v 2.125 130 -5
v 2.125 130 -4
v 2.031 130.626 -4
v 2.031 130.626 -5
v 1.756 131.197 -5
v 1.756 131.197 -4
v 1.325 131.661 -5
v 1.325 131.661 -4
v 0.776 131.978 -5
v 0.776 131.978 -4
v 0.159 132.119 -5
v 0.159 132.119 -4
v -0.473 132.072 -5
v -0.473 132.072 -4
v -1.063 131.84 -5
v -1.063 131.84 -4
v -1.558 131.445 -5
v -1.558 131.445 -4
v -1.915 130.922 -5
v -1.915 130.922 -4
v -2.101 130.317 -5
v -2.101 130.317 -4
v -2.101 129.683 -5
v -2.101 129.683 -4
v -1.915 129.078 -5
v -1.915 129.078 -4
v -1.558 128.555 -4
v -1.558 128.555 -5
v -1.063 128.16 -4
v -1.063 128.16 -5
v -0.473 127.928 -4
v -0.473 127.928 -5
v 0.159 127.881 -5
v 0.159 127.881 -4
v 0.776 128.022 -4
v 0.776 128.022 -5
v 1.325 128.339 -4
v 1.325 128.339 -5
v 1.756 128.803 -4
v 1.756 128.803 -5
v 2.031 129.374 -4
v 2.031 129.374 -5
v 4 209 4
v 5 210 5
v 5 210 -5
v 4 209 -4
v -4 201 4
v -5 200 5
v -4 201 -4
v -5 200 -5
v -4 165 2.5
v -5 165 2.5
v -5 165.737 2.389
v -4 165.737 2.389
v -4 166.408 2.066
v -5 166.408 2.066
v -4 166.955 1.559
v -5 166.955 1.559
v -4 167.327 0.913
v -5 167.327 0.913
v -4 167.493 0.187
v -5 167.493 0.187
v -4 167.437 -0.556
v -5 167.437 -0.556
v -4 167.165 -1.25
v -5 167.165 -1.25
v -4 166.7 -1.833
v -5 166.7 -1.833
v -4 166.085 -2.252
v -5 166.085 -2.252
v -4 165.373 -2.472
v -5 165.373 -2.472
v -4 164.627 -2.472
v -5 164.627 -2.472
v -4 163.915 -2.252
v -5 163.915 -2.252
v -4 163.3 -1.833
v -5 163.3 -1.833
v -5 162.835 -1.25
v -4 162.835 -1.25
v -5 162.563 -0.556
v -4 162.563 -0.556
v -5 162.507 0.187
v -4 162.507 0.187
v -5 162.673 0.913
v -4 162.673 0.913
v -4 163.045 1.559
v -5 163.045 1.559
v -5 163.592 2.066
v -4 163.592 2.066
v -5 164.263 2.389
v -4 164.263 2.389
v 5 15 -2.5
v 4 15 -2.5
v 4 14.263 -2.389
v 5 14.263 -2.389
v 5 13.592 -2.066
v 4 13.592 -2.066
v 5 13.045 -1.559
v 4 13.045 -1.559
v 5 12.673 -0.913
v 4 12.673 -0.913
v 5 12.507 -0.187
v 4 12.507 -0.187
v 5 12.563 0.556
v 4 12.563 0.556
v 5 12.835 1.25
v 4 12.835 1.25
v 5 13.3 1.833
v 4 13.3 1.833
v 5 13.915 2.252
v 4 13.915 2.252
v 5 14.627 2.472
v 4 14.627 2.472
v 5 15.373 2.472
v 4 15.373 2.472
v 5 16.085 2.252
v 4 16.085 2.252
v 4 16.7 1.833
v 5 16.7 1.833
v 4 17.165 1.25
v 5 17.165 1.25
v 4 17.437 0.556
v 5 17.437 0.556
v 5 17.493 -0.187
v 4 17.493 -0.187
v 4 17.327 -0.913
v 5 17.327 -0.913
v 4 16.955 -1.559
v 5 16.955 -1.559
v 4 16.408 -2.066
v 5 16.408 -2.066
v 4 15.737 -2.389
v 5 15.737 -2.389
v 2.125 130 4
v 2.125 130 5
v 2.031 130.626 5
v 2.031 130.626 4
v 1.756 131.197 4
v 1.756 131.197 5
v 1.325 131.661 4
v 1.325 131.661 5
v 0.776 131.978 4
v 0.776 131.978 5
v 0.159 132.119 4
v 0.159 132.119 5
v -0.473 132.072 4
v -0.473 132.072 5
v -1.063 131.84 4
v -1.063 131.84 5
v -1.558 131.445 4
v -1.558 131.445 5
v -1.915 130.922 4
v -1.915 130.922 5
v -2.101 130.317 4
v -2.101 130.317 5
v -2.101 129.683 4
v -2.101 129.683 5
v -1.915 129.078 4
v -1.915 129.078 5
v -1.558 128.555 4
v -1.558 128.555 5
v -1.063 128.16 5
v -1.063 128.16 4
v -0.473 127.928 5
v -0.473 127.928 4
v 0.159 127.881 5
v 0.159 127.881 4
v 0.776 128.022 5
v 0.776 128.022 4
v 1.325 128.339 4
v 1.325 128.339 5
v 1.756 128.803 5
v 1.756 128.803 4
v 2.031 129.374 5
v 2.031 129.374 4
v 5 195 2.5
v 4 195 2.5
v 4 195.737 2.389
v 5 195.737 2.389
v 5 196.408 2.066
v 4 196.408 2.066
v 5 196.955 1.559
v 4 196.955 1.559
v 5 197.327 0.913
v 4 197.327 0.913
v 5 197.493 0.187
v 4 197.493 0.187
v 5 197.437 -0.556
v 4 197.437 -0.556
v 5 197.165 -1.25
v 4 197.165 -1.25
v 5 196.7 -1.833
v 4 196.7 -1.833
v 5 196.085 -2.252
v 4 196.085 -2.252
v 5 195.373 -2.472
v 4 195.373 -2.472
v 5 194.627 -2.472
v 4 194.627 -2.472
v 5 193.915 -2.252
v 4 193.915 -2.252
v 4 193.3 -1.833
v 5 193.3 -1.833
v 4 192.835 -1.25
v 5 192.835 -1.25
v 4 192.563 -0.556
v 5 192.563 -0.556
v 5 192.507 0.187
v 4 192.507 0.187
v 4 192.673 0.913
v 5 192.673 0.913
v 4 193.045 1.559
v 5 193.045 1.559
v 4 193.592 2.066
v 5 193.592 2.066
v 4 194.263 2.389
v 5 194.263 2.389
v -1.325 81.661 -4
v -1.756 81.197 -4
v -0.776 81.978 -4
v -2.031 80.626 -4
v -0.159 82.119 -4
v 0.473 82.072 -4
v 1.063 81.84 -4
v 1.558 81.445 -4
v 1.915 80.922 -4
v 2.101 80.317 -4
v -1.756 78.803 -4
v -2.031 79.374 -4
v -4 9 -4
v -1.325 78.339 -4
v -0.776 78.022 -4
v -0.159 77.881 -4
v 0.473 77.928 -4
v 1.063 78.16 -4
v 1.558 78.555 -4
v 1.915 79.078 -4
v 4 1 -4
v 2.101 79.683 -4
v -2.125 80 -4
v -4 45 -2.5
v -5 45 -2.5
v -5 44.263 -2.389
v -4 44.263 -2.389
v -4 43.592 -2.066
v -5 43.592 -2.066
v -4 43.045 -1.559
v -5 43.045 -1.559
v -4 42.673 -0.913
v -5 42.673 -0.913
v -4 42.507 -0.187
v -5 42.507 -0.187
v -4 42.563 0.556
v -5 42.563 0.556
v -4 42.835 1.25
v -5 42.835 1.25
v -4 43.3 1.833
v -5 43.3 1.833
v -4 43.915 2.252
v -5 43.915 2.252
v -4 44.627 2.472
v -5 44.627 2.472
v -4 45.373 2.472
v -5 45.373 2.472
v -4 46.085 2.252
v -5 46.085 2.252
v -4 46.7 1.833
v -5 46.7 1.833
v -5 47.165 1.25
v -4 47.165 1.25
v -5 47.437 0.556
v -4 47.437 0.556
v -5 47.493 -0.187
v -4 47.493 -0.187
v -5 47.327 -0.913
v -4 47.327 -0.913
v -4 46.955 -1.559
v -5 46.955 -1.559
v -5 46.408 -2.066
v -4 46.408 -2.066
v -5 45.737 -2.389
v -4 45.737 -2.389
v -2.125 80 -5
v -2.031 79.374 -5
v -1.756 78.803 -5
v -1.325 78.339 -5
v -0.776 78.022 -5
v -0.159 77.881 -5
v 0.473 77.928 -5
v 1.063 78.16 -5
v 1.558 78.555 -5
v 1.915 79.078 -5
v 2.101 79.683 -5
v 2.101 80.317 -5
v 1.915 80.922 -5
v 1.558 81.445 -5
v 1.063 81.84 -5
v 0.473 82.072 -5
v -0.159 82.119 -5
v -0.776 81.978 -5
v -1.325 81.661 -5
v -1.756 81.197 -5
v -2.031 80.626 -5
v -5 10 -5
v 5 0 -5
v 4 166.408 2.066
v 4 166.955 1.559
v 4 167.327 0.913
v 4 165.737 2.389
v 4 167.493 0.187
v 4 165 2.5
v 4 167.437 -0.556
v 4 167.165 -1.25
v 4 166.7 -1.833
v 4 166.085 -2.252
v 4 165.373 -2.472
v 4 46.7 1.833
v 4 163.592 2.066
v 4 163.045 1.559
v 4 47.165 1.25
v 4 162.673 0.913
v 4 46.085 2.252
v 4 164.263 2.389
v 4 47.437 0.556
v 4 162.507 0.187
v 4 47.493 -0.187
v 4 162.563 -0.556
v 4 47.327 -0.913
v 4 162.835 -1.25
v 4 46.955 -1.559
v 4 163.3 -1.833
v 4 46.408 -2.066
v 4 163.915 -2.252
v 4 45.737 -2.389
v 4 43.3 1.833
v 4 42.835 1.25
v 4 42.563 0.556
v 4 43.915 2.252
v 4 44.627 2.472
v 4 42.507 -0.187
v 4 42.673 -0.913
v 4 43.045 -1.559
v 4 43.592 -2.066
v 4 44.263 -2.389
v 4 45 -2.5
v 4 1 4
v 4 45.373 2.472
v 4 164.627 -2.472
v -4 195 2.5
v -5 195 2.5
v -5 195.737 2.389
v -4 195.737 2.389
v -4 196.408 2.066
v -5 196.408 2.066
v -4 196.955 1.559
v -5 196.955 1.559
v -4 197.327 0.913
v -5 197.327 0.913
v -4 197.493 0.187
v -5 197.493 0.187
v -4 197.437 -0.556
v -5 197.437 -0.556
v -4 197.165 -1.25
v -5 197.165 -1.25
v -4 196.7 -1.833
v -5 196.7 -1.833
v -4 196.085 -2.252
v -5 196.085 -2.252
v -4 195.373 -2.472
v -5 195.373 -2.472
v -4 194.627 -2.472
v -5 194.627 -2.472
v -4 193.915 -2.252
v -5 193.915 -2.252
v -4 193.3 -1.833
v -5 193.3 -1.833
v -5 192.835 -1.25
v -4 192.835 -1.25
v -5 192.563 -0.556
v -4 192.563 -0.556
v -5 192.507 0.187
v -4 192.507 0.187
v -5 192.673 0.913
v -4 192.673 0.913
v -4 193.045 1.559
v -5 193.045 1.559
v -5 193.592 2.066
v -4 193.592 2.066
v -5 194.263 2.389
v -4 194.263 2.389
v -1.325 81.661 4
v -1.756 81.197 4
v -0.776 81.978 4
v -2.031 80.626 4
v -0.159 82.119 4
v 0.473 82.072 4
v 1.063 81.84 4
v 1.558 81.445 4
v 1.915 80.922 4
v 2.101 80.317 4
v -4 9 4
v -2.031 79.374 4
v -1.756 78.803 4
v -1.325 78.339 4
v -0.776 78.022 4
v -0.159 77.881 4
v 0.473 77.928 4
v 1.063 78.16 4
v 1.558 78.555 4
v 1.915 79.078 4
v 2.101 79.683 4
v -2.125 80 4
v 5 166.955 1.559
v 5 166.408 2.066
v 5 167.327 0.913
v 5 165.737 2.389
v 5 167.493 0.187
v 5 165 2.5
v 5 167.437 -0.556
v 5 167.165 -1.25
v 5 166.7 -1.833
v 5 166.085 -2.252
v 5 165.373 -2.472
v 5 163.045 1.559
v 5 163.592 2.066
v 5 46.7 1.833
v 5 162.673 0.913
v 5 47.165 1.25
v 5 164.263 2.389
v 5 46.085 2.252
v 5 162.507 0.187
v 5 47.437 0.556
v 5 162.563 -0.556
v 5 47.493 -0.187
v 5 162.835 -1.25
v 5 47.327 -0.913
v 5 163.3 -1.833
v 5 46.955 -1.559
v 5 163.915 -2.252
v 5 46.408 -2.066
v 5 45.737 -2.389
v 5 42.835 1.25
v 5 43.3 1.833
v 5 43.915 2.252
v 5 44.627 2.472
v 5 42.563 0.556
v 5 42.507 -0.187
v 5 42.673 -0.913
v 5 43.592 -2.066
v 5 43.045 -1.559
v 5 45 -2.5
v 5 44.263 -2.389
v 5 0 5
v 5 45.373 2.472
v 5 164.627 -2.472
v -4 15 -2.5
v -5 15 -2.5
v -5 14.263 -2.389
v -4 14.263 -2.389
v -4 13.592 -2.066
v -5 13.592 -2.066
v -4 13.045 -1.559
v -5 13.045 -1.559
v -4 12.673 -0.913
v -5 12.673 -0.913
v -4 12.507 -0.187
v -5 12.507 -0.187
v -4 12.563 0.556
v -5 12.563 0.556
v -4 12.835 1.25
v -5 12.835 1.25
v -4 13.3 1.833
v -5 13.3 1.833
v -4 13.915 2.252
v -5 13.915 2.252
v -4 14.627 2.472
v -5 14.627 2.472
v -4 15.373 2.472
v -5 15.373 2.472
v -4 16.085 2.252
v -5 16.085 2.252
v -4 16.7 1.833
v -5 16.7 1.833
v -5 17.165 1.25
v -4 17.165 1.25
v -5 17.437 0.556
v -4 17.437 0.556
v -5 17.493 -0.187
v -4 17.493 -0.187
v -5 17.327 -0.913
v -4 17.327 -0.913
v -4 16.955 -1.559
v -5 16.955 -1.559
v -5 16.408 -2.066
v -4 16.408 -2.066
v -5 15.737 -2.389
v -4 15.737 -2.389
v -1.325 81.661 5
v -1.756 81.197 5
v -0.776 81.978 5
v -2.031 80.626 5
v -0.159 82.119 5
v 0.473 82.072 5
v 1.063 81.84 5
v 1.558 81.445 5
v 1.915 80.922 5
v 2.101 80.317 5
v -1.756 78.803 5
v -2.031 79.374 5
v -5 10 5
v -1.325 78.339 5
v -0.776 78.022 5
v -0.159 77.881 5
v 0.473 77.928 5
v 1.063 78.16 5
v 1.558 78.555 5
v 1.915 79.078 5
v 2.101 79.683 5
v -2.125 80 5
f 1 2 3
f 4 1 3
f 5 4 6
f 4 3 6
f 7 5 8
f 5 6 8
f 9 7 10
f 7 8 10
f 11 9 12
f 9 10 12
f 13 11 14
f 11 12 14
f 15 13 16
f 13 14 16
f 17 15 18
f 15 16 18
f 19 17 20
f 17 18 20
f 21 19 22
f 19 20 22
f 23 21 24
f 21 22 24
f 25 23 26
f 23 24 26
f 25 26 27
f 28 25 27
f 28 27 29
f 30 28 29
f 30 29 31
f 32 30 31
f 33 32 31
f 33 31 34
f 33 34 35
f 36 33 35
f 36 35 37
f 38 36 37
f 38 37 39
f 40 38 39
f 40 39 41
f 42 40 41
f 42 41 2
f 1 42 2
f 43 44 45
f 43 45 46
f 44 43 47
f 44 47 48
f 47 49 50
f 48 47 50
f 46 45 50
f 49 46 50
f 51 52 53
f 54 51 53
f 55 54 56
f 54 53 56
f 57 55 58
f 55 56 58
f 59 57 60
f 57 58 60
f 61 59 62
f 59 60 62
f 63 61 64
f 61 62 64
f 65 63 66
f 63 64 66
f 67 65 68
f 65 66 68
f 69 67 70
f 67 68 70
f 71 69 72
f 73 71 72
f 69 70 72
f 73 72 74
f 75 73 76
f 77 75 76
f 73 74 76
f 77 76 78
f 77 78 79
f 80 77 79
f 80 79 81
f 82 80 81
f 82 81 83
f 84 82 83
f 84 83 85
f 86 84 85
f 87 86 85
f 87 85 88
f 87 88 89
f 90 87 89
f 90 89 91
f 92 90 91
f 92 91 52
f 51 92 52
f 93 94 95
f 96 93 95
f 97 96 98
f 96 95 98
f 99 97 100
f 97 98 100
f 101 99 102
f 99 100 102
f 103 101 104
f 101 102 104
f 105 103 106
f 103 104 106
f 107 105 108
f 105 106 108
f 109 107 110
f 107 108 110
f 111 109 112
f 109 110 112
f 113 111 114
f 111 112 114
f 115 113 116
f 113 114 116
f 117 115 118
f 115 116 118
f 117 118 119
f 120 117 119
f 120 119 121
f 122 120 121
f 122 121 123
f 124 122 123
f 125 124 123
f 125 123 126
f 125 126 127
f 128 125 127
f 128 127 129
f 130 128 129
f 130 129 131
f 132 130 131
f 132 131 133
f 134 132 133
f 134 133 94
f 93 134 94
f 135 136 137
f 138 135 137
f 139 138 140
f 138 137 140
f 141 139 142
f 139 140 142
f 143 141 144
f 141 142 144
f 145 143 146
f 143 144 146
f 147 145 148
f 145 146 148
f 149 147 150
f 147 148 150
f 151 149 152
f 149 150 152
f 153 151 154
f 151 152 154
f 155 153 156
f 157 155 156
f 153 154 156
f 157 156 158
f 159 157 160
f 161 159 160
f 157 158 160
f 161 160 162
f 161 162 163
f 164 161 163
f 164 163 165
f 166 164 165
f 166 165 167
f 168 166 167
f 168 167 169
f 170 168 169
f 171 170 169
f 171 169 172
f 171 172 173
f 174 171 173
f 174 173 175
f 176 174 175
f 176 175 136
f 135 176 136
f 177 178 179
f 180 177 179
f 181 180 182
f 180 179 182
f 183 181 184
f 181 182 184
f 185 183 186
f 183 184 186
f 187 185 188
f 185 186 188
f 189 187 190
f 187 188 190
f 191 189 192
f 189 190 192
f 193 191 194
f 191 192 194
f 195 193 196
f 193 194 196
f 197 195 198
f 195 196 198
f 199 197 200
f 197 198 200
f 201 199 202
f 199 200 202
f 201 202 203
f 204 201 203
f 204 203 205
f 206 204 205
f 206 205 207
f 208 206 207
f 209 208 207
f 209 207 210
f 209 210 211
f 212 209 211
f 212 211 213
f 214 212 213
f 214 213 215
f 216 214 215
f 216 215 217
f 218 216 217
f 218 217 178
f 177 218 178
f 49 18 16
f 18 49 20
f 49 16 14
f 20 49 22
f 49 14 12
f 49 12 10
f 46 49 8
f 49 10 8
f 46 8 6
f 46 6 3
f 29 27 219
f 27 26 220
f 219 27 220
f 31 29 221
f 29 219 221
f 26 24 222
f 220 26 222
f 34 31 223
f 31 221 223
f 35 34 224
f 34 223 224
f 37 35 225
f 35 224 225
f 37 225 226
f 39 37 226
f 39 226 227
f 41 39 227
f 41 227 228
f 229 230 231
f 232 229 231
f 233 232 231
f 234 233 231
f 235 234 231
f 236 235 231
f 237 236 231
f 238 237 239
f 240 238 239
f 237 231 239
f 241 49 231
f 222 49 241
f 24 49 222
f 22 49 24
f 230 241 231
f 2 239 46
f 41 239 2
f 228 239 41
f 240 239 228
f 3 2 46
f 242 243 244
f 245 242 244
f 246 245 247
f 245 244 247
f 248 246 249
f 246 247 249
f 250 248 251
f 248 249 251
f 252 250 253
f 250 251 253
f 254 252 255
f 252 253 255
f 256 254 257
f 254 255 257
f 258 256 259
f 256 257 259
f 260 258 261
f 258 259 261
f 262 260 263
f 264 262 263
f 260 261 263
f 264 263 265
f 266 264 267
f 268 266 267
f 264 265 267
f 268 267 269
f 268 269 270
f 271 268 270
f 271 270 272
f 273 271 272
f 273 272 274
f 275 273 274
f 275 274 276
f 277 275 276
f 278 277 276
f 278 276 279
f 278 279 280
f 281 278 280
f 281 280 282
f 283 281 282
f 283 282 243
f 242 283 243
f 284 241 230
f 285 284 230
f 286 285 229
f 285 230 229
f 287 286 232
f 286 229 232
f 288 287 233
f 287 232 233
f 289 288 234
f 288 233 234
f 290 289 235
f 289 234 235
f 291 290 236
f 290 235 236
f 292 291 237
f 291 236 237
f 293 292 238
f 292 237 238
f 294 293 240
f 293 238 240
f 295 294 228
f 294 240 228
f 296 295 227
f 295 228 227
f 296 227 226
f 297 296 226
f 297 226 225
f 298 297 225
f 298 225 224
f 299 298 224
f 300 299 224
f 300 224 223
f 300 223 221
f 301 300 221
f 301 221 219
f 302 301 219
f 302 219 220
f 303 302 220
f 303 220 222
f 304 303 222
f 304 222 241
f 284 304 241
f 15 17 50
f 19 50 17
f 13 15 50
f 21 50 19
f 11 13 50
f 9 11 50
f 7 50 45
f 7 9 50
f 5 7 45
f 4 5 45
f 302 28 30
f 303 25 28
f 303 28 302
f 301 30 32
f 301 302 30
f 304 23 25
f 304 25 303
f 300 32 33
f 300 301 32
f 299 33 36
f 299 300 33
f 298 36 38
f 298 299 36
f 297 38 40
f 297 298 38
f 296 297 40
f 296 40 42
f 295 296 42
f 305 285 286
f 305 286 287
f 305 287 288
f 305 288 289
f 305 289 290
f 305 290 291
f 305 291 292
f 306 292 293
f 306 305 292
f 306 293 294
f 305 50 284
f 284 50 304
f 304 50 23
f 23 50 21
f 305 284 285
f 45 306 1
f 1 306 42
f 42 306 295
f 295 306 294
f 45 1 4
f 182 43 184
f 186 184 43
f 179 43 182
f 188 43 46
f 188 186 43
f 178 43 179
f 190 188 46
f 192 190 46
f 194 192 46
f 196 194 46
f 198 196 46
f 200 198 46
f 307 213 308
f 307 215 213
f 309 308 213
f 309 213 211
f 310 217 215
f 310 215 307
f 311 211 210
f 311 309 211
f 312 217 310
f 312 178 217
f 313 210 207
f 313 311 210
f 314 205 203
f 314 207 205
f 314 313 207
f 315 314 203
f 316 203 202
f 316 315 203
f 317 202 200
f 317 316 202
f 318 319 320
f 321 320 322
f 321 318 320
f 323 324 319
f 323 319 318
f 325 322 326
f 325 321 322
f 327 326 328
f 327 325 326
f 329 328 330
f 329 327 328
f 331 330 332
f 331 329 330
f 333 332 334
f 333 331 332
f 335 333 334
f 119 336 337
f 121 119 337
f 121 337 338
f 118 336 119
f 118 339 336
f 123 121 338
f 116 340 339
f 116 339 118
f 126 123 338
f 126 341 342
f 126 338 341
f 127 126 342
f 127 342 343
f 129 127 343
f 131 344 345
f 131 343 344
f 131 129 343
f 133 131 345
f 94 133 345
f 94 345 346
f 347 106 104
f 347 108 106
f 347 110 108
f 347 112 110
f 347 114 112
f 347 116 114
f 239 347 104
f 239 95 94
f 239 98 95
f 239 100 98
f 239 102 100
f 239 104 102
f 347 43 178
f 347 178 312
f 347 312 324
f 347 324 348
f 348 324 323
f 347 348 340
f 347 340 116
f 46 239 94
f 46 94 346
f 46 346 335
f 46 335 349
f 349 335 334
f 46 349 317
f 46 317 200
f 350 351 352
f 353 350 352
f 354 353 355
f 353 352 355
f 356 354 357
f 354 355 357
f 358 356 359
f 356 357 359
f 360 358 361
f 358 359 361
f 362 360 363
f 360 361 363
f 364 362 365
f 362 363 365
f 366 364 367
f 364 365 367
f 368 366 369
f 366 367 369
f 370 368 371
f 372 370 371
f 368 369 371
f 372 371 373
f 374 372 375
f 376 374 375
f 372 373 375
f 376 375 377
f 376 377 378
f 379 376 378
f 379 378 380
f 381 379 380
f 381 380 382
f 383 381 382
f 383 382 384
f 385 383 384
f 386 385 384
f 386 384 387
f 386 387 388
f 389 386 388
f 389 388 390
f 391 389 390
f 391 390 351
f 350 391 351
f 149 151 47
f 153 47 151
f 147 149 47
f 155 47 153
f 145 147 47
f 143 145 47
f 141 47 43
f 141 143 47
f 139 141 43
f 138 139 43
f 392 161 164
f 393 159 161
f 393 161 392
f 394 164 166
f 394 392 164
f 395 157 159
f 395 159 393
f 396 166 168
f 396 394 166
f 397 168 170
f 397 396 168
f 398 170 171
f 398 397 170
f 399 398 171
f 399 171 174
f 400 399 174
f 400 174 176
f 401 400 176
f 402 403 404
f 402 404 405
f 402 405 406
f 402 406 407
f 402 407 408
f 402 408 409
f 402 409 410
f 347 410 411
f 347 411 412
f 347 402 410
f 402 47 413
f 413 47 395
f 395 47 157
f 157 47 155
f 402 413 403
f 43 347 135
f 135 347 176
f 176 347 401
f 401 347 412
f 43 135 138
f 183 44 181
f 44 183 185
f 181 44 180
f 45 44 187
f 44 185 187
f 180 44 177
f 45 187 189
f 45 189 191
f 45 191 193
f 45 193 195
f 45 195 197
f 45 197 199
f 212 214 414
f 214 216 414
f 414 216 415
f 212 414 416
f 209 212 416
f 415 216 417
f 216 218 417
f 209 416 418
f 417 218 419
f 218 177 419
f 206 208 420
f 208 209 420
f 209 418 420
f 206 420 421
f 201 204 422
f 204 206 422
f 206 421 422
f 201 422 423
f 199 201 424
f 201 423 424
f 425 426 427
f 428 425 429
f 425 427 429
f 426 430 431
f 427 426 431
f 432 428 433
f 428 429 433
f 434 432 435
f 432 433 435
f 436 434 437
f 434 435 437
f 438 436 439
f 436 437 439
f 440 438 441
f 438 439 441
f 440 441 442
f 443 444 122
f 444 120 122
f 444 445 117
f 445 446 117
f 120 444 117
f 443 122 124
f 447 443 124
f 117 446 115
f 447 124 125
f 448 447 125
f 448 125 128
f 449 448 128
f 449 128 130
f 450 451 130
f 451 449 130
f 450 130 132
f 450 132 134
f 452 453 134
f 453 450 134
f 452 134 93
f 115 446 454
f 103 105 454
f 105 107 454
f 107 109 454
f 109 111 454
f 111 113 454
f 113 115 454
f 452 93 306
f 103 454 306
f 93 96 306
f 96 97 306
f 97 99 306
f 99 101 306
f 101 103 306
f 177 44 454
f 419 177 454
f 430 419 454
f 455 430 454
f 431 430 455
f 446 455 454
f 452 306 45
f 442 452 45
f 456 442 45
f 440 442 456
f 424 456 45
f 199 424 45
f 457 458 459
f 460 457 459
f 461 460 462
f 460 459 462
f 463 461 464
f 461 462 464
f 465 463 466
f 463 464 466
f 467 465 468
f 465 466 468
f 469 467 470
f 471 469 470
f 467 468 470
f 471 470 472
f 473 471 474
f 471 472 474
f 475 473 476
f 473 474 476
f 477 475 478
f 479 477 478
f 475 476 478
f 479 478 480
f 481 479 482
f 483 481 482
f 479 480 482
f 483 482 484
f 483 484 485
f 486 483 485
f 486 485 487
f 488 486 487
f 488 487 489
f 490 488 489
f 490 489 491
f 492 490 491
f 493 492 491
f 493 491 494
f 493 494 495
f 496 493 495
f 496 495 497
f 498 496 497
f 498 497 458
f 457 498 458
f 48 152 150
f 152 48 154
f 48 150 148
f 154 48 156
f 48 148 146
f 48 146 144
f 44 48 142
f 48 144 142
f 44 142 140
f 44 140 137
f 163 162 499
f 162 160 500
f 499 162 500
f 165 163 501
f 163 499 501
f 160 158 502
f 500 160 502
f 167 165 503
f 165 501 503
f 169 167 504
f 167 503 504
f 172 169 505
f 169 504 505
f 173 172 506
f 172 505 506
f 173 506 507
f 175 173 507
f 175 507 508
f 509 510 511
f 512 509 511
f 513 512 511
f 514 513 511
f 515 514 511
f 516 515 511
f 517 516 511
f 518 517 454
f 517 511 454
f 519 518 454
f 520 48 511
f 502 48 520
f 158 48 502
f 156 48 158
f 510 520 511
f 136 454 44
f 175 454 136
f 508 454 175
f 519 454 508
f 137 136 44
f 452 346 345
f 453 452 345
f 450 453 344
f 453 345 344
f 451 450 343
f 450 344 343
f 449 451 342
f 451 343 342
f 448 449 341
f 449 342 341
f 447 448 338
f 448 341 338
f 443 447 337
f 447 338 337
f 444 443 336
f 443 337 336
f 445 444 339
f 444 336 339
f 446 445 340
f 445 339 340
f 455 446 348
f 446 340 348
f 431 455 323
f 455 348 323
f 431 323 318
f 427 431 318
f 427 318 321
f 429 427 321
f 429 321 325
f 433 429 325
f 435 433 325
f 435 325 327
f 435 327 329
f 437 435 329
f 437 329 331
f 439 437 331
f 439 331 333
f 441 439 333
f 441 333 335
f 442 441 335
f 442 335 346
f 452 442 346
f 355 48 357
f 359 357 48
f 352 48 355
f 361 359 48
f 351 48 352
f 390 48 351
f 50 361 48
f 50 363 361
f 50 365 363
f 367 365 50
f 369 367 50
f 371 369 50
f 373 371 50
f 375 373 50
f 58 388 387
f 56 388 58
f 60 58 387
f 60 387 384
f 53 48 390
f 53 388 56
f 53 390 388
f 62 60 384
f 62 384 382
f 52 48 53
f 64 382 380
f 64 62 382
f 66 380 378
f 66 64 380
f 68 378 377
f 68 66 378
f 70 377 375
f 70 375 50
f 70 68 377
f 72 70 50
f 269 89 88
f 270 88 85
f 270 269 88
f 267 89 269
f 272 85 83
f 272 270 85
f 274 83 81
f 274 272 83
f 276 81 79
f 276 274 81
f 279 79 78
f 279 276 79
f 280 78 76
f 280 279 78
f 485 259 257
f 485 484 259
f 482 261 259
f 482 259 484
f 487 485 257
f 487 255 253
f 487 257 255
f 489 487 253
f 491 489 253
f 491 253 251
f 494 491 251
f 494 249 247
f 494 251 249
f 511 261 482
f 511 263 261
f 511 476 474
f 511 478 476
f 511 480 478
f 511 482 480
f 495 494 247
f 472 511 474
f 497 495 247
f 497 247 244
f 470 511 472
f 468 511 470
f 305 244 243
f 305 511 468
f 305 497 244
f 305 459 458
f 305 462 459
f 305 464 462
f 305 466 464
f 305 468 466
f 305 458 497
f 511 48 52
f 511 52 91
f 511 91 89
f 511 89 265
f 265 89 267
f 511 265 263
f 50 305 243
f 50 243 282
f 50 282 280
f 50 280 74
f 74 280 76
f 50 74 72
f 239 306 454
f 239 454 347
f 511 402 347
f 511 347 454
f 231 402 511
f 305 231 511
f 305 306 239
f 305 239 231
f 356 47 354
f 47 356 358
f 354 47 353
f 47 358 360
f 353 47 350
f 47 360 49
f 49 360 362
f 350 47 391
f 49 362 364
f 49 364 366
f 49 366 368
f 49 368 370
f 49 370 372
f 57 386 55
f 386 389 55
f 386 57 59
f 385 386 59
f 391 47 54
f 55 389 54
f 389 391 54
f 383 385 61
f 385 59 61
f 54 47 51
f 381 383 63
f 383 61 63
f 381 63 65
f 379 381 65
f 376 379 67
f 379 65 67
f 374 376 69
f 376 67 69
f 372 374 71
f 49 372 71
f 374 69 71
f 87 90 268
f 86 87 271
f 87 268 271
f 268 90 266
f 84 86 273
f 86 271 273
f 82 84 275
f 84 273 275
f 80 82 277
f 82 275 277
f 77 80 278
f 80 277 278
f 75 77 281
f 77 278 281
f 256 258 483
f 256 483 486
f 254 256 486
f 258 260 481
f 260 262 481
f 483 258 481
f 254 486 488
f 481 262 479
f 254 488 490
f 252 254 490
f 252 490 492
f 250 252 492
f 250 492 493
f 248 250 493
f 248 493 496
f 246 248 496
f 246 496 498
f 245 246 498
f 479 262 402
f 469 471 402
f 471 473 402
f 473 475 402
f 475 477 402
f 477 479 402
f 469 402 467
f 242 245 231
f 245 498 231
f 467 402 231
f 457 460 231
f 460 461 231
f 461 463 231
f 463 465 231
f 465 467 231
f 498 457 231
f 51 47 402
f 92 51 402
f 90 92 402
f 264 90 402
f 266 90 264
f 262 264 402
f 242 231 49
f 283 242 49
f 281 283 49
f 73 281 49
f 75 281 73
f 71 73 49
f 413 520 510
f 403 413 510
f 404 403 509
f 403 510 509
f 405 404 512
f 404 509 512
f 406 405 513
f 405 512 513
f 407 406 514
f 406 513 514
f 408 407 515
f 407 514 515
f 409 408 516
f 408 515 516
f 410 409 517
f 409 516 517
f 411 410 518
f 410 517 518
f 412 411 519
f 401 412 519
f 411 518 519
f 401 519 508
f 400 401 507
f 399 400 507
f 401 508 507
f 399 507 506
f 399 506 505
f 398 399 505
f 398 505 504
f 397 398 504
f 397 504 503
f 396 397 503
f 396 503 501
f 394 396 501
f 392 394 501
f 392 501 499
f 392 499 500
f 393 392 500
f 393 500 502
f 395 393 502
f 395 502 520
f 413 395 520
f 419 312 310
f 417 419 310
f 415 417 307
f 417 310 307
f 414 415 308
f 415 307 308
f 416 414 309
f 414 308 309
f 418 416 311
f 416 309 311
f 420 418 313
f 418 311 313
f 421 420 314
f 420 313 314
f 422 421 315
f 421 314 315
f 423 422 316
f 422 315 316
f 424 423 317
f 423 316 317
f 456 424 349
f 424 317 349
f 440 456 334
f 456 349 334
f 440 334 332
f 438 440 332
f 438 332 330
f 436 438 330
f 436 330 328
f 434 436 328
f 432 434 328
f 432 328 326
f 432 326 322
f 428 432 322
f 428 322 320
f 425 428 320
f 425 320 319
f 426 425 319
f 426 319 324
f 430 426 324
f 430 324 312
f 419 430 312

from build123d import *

# Parameters (mm, degrees)
SKETCH_1_W          = 10
SKETCH_1_H          = 10
SKETCH_1_W_2        = 8
SKETCH_1_H_2        = 8
EXTRUDE_1_DEPTH     = 210
CUT_EXTRUDE_3_DEPTH = 10
SKETCH_5_R          = 2.5
CUT_EXTRUDE_4_DEPTH = 10
SKETCH_11_R         = 2.125
CUT_EXTRUDE_6_DEPTH = 10


with BuildPart() as part:
    # 草图1 → 凸台-拉伸1 (new body)
    with BuildSketch(Plane(origin=(0, 0, 0), x_dir=(1, 0, 0), z_dir=(0, 1, 0))):
        Rectangle(SKETCH_1_W, SKETCH_1_H)
        Rectangle(SKETCH_1_W_2, SKETCH_1_H_2, mode=Mode.SUBTRACT)
    extrude(amount=EXTRUDE_1_DEPTH)

    # 草图4 → 切除-拉伸3 (cut)
    with BuildSketch(Plane(origin=(0, 0, -5), x_dir=(-1, 0, 0), z_dir=(0, 0, -1))):
        Polygon((-5, 210), (5, 200), (5, 210), align=None)
        Polygon((5, 0), (-5, 0), (5, 10), align=None)
    extrude(amount=-CUT_EXTRUDE_3_DEPTH, mode=Mode.SUBTRACT)

    # 草图5 → 切除-拉伸4 (cut)
    with BuildSketch(Plane.ZY.offset(5)):
        with Locations((0, 165)):
            Circle(SKETCH_5_R)
        with Locations(Location((0, 45, 0), (0, 0, 180))):
            Circle(SKETCH_5_R)
        with Locations((0, 195)):
            Circle(SKETCH_5_R)
        with Locations(Location((0, 15, 0), (0, 0, 180))):
            Circle(SKETCH_5_R)
    extrude(amount=-CUT_EXTRUDE_4_DEPTH, mode=Mode.SUBTRACT)

    # 草图11 → 切除-拉伸6 (cut)
    with BuildSketch(Plane.XY.offset(5)):
        with Locations((0, 130)):
            Circle(SKETCH_11_R)
        with Locations(Location((0, 80, 0), (0, 0, 180))):
            Circle(SKETCH_11_R)
    extrude(amount=-CUT_EXTRUDE_6_DEPTH, mode=Mode.SUBTRACT)


solid = part.part
